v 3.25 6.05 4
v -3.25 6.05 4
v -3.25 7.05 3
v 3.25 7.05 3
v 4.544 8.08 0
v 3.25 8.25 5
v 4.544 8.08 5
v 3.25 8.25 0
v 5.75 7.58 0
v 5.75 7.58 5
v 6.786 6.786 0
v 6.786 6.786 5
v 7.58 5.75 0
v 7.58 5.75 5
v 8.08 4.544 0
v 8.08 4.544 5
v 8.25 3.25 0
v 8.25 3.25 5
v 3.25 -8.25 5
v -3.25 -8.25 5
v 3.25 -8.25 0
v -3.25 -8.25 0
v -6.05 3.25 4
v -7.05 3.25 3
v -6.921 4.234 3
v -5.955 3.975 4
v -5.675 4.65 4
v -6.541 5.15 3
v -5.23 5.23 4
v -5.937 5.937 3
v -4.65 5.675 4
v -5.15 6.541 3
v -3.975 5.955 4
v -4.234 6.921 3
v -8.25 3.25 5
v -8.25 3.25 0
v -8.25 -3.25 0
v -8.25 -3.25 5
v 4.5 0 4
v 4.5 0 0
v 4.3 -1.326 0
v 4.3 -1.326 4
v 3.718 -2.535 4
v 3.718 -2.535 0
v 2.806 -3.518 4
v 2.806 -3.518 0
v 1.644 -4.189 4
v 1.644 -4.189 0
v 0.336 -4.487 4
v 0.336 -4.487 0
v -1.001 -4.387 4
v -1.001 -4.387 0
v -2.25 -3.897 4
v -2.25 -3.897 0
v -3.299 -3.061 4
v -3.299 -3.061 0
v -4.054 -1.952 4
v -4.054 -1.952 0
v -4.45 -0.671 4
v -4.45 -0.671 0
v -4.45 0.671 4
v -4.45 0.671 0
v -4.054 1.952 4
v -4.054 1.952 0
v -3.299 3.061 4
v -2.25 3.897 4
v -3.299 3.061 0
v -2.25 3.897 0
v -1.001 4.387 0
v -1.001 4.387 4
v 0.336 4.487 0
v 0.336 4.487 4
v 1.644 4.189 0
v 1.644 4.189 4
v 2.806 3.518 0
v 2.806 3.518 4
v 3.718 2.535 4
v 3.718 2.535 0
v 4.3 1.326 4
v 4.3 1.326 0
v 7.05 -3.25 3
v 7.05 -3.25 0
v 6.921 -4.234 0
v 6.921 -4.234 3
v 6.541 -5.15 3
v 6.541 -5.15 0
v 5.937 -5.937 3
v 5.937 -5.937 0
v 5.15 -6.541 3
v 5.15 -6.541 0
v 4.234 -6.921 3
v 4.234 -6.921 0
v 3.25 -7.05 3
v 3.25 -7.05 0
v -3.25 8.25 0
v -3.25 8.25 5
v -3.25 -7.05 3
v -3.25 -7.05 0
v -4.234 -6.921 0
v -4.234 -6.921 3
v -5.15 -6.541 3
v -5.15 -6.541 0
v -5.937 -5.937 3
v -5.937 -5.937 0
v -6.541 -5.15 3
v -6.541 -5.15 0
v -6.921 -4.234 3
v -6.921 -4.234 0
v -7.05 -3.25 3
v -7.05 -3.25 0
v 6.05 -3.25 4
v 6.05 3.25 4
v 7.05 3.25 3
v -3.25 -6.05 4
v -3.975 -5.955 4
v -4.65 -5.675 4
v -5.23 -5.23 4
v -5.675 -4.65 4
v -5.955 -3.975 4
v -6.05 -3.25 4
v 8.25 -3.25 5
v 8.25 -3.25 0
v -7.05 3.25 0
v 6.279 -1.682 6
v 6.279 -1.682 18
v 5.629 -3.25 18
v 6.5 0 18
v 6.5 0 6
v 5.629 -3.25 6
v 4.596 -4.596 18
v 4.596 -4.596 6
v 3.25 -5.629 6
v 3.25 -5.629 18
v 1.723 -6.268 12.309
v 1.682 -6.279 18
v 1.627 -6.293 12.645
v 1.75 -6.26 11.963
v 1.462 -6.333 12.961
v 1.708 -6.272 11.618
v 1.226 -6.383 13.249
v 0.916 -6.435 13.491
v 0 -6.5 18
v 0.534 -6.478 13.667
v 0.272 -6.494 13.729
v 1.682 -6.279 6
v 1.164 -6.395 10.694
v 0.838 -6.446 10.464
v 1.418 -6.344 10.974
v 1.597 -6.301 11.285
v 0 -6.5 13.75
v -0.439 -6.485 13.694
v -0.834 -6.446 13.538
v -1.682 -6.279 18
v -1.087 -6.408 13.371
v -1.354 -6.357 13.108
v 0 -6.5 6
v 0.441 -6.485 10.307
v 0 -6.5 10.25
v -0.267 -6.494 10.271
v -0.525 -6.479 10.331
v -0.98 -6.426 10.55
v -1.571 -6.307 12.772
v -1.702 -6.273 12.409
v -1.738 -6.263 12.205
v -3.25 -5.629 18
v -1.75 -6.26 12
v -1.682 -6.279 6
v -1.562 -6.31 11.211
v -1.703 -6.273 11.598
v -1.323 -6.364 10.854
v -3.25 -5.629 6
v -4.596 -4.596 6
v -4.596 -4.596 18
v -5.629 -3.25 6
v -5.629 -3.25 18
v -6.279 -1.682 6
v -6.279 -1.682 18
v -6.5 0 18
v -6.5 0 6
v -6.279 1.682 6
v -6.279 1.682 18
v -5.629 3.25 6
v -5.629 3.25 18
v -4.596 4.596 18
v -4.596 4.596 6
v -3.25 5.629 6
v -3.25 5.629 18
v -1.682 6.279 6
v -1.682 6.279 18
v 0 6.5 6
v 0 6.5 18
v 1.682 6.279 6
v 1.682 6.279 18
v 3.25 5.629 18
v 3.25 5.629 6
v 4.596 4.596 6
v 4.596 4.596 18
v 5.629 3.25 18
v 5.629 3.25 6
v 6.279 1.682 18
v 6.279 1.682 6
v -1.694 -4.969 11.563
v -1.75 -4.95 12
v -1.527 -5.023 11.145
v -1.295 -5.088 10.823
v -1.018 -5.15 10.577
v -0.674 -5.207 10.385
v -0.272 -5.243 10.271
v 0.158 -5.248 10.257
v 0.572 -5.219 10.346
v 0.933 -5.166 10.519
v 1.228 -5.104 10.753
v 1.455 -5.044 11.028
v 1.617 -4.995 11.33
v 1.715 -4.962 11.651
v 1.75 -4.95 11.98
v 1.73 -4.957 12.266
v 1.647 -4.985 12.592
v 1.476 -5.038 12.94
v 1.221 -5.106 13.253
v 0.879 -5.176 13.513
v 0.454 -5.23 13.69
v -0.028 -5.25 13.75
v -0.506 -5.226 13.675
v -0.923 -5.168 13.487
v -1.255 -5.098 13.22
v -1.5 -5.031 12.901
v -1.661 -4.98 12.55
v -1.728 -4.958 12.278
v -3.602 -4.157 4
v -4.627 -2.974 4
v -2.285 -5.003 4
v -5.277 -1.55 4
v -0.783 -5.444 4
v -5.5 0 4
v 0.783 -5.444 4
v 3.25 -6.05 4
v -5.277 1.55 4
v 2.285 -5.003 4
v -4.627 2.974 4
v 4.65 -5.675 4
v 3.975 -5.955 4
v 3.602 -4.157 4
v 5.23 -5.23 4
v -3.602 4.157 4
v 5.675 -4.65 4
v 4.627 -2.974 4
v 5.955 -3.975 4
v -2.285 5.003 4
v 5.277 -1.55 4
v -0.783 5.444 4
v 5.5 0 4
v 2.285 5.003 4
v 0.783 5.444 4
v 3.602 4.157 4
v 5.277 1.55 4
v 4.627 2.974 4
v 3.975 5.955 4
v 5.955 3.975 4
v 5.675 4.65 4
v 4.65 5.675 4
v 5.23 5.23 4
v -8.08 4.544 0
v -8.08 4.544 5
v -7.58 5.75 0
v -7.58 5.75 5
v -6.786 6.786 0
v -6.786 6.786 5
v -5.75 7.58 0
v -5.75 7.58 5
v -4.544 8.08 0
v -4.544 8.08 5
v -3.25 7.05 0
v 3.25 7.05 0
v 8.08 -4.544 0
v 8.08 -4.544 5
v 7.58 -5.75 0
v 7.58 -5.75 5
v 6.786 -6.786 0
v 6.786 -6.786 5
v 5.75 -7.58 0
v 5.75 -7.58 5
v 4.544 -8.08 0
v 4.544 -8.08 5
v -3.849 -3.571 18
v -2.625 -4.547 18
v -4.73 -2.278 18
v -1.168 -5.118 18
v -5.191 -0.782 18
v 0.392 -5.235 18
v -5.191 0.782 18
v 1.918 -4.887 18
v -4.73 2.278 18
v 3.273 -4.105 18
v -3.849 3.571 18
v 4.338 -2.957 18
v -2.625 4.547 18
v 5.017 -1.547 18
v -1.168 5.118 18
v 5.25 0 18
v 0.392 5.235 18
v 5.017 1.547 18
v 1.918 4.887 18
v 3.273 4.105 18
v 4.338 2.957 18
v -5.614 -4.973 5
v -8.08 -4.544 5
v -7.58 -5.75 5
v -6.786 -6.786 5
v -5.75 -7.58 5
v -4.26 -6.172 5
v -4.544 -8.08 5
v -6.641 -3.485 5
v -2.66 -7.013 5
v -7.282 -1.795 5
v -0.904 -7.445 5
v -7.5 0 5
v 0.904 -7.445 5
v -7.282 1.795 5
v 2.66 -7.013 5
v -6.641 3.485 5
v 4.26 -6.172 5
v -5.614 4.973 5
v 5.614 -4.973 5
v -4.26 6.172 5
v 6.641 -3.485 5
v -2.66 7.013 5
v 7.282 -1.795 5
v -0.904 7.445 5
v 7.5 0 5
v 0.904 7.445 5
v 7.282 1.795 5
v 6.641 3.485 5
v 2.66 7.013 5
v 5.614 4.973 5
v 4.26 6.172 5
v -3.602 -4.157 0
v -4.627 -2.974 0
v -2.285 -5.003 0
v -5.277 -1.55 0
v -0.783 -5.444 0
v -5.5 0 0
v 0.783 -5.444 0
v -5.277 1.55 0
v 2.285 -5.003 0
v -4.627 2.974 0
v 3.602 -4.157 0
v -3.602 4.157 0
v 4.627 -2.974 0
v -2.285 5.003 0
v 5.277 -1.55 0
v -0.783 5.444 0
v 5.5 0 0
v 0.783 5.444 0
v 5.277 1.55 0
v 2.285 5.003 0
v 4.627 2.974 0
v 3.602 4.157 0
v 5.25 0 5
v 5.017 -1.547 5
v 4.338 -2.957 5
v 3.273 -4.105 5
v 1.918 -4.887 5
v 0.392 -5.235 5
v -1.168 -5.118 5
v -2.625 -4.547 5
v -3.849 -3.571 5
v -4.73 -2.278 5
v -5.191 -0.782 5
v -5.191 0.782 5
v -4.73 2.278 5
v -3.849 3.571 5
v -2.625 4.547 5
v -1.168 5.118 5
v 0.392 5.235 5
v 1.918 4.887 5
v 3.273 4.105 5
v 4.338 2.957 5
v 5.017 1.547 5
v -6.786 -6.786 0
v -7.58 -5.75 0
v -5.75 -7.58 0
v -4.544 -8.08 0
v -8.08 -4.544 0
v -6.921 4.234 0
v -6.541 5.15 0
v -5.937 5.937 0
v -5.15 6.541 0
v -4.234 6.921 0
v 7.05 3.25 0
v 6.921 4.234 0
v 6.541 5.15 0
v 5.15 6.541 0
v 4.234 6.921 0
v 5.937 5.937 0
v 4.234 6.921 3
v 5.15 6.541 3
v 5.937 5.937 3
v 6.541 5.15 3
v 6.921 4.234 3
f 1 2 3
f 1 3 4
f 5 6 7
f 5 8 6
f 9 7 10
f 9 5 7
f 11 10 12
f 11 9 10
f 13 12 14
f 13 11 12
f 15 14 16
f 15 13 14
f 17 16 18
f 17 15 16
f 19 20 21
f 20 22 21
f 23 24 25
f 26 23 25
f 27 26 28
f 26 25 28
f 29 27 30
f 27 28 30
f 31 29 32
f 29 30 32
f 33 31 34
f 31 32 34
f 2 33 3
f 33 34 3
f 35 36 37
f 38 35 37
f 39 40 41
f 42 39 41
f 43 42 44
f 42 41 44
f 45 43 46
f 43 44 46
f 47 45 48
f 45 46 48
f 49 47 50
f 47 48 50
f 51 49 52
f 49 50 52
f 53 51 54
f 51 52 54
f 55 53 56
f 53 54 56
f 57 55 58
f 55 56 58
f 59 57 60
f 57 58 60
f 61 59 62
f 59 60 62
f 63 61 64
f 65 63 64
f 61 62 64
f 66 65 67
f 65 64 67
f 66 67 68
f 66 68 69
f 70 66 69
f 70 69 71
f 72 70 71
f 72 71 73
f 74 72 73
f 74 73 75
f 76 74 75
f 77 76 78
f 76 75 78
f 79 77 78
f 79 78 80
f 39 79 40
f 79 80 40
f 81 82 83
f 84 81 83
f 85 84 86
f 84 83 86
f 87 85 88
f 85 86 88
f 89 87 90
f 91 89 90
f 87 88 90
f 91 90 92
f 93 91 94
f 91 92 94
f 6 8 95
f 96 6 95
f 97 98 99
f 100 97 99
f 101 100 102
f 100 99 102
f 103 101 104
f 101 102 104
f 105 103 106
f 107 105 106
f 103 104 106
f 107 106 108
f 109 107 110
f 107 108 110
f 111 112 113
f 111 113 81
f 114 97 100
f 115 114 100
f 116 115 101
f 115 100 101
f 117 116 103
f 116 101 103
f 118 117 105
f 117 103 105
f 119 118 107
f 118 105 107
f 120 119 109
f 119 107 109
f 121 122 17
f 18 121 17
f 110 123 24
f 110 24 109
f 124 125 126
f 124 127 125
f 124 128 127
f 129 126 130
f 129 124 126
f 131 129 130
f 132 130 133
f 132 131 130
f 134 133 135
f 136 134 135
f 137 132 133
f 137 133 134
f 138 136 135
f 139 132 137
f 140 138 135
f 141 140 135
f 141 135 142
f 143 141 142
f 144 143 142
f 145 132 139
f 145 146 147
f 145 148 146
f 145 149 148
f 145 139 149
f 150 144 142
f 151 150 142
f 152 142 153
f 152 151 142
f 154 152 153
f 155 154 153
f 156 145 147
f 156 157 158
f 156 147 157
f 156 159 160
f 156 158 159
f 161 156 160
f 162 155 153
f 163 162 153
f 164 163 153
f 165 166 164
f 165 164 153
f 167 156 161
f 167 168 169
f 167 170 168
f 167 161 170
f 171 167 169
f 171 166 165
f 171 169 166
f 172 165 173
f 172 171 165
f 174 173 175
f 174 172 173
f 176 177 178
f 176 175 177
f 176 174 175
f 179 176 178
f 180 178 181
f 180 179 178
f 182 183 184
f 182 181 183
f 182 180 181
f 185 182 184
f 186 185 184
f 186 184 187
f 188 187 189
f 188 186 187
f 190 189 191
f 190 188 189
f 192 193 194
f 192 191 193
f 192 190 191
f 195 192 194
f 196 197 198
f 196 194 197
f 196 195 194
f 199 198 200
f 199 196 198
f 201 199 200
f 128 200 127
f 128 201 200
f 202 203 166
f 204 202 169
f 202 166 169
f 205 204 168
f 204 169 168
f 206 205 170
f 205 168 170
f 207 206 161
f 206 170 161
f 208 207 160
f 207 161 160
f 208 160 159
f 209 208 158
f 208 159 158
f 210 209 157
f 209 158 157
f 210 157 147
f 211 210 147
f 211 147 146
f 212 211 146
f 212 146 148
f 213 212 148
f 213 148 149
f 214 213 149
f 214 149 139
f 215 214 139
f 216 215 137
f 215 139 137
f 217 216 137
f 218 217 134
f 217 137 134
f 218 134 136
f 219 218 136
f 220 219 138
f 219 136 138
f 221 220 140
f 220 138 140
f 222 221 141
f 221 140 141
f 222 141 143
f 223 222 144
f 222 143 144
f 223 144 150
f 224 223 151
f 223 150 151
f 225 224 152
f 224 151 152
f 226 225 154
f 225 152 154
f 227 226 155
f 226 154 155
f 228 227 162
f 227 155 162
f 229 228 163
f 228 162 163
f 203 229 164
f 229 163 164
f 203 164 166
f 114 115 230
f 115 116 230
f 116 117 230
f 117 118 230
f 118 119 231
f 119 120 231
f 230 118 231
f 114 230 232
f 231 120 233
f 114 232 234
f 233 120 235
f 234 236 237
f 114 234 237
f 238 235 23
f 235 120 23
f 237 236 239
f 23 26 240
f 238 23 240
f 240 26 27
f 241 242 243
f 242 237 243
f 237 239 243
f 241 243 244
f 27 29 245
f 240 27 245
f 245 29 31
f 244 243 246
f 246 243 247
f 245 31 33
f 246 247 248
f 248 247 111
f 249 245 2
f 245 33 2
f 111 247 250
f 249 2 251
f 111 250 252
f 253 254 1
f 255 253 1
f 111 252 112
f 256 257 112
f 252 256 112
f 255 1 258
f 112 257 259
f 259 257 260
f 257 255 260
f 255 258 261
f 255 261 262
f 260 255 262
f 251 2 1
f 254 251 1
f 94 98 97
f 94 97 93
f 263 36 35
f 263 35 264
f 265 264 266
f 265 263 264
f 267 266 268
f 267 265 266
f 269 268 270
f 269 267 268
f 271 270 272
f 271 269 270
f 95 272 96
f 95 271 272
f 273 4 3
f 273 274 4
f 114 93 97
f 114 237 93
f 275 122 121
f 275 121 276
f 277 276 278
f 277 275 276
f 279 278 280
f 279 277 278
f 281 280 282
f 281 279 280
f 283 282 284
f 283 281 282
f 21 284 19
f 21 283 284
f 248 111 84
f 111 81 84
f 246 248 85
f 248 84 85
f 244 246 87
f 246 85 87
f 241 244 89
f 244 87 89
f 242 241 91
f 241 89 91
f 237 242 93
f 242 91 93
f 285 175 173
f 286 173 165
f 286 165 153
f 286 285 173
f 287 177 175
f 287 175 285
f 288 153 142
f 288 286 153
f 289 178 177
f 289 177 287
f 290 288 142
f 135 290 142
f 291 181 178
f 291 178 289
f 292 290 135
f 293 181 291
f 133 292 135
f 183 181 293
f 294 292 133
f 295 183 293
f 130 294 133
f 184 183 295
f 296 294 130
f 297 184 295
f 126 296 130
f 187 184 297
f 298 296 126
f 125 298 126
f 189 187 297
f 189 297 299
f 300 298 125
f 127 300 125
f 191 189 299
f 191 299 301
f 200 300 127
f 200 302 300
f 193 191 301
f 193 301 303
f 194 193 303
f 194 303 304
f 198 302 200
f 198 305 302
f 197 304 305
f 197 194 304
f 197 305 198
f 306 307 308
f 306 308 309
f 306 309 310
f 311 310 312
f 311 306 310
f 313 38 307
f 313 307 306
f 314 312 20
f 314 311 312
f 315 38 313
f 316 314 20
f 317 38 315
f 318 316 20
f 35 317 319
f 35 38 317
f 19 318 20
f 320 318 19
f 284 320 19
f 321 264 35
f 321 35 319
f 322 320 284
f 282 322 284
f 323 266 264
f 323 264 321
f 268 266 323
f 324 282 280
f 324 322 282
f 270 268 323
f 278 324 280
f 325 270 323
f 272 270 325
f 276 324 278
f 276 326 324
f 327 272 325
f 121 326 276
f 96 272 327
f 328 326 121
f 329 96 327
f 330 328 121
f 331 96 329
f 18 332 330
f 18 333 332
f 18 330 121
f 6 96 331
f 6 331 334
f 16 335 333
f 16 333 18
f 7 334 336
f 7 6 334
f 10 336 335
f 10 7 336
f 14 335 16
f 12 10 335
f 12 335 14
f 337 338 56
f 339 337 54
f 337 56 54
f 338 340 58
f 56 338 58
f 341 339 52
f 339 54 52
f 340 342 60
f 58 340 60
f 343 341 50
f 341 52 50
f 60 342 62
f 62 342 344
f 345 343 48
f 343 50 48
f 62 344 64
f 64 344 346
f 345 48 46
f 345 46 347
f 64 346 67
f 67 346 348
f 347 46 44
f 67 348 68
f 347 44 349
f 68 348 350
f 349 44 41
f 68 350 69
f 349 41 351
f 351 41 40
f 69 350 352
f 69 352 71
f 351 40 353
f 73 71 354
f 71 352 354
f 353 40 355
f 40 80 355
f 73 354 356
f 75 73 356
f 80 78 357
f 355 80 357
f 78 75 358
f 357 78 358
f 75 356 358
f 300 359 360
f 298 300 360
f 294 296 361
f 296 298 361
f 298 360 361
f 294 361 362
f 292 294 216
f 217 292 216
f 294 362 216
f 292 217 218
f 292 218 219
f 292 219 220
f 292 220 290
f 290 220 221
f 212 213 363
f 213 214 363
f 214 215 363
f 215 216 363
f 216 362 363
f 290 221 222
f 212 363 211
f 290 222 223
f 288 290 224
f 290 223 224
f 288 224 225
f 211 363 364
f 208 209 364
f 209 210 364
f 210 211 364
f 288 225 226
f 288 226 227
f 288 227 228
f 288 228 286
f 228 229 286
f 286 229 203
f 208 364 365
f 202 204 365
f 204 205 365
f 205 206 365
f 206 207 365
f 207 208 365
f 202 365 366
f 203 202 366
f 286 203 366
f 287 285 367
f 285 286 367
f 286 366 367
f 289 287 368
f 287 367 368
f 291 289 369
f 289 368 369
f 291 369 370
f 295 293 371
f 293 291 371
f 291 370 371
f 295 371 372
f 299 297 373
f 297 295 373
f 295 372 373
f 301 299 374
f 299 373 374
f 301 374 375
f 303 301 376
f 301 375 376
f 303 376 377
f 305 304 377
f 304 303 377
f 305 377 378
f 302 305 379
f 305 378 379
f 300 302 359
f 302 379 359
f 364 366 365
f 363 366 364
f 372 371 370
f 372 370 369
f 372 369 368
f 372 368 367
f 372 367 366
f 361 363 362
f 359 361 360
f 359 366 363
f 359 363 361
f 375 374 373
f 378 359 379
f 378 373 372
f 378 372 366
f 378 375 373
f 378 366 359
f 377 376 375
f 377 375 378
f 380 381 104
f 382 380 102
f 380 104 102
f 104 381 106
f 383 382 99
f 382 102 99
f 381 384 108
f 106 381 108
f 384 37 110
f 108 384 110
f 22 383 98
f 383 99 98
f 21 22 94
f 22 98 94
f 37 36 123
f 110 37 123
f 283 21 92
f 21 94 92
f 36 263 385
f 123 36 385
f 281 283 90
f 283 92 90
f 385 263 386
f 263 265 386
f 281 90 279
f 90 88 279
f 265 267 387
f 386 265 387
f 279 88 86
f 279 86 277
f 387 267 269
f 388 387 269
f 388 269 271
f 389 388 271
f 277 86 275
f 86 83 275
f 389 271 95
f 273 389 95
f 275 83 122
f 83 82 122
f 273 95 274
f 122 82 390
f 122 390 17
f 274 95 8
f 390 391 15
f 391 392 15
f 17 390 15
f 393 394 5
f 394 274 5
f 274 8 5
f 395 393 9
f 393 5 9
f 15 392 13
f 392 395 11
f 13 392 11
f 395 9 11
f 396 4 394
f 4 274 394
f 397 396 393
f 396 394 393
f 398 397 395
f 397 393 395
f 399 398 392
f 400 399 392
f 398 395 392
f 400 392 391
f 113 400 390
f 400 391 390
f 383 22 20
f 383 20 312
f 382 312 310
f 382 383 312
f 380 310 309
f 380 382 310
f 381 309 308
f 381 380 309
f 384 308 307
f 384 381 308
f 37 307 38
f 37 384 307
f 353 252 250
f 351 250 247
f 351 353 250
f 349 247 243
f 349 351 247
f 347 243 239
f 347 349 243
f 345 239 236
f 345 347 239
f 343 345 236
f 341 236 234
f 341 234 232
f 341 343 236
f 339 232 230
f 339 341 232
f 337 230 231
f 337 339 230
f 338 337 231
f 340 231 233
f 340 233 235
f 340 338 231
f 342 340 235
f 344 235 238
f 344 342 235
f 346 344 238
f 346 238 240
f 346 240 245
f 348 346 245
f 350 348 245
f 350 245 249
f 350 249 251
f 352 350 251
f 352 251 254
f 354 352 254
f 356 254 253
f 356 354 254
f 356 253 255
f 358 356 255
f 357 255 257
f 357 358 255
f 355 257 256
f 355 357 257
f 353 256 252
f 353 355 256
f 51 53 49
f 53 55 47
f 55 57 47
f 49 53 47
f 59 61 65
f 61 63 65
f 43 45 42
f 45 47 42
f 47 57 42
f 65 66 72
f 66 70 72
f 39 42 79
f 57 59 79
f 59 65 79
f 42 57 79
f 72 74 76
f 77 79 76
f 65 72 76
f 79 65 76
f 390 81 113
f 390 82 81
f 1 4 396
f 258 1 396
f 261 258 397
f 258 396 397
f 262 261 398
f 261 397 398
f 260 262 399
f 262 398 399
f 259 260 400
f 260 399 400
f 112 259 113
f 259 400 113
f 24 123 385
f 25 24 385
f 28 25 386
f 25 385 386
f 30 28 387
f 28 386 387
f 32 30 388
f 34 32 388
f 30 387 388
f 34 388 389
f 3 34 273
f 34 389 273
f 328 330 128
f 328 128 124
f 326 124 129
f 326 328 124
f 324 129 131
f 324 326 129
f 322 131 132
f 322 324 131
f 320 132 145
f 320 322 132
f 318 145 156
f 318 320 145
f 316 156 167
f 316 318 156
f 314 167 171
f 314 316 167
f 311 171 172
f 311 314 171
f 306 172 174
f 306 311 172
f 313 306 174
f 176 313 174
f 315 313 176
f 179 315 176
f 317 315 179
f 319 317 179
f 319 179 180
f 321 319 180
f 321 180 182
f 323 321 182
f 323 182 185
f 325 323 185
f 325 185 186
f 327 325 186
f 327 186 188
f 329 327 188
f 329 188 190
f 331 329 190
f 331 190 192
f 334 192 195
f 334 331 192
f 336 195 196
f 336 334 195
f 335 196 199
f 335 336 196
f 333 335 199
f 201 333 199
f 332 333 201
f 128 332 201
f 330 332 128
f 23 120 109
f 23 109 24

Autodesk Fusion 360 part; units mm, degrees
sketch "Sketch1" plane through (0, 0, 0) normal (0, 0, 1) x (1, 0, 0)
  circle A0 centre (0, 0) radius 5.25
  circle A1 centre (0, 0) radius 6.5
  dimension "d1" = 10.5
  dimension "d2" = 1.25
sketch "Sketch2" plane through (0, 0, 0) normal (0, 0, 1) x (1, 0, 0)
  arc A0 (3.25, -8.25) -> (8.25, -3.25) centre (3.25, -3.25) ccw
  line L0 (3.25, 7.05) -> (-3.25, 7.05)
  line L1 (-8.25, 8.25) -> (8.25, -8.25) construction
  line L2 (8.25, -3.25) -> (8.25, 3.25)
  line L3 (7.05, -3.25) -> (7.05, 3.25)
  circle A1 centre (0, 0) radius 5.5
  arc A2 (-3.25, 8.25) -> (-8.25, 3.25) centre (-3.25, 3.25) ccw
  line L4 (8.25, 8.25) -> (-8.25, -8.25) construction
  line L5 (-8.25, 3.25) -> (-8.25, -3.25)
  arc A3 (-7.05, -3.25) -> (-3.25, -7.05) centre (-3.25, -3.25) ccw
  line L6 (3.25, 9.25) -> (-3.25, 9.25)
  arc A4 (-8.25, -3.25) -> (-3.25, -8.25) centre (-3.25, -3.25) ccw
  line L7 (-3.25, -7.05) -> (3.25, -7.05)
  arc A5 (8.25, 3.25) -> (3.25, 8.25) centre (3.25, 3.25) ccw
  arc A6 (3.25, -9.25) -> (9.25, -3.25) centre (3.25, -3.25) ccw
  line L8 (3.25, 8.25) -> (-3.25, 8.25)
  line L9 (9.25, -3.25) -> (9.25, 3.25)
  arc A7 (3.25, -7.05) -> (7.05, -3.25) centre (3.25, -3.25) ccw
  arc A8 (-3.25, 7.05) -> (-7.05, 3.25) centre (-3.25, 3.25) ccw
  arc A9 (-9.25, -3.25) -> (-3.25, -9.25) centre (-3.25, -3.25) ccw
  circle A10 centre (0, 0) radius 4.5
  line L10 (-3.25, -9.25) -> (3.25, -9.25)
  arc A11 (7.05, 3.25) -> (3.25, 7.05) centre (3.25, 3.25) ccw
  line L11 (-9.25, 3.25) -> (-9.25, -3.25)
  arc A12 (9.25, 3.25) -> (3.25, 9.25) centre (3.25, 3.25) ccw
  line L12 (-3.25, -8.25) -> (3.25, -8.25)
  arc A13 (-3.25, 9.25) -> (-9.25, 3.25) centre (-3.25, 3.25) ccw
  line L13 (-7.05, 3.25) -> (-7.05, -3.25)
  dimension "d3" = 1
  dimension "d4" = 1.2
  dimension "d5" = 1
  dimension "d6" = 16.5
  dimension "d7" = 16.5
  dimension "d8" = 5
  dimension "d9" = 11
extrude "Extrude1" add sketch "Sketch2" along normal blind 5 contours A0 L2 A2 L5 A4 A5 L8 L12 | A1 makes body 1 at (7.45, 1.0833, 0) makes body 2 at (5.4932, -0.2742, 3.3333)
extrude "Extrude2" add sketch "Sketch2" against normal blind 1 from surface at 5 contours A0 L2 A2 L5 A4 A5 L8 L12 | L0 L3 A3 L7 A7 A8 A11 L13 | A1 | A10 bodies 1 2
extrude "Extrude3" add sketch "Sketch1" along normal blind 13 from surface at 5 bodies 1
ref_plane "WorkPlane1" through (0, -6.5, 9.9379) normal (0, -1, 0) x (-1, 0, 0)
sketch "Sketch3" plane through (0, -6.5, 0) normal (0, -1, 0) x (-1, 0, 0)
  line L0 (0, 0) -> (0, -19) construction
  line L1 (0, 0) -> (0, -5) construction
  line L2 (0, -5) -> (0, -19) construction
  circle A0 centre (0, -12) radius 1.75
  dimension "d19" = 19
  dimension "d20" = 5
  dimension "d21" = 3.5
extrude "Extrude4" cut sketch "Sketch3" against normal blind 4 bodies 1
chamfer "Chamfer1" distance 1 angle 45 1 edges at (-6.0601, 2.3505, 5) on bodies 1
chamfer "Chamfer2" distance 1 angle 45 8 edges at (5.937, -5.937, 4) (7.05, 0, 4) (5.937, 5.937, 4) (0, 7.05, 4) (-5.937, 5.937, 4) (-7.05, 0, 4) (-5.937, -5.937, 4) (0, -7.05, 4) on bodies 1
